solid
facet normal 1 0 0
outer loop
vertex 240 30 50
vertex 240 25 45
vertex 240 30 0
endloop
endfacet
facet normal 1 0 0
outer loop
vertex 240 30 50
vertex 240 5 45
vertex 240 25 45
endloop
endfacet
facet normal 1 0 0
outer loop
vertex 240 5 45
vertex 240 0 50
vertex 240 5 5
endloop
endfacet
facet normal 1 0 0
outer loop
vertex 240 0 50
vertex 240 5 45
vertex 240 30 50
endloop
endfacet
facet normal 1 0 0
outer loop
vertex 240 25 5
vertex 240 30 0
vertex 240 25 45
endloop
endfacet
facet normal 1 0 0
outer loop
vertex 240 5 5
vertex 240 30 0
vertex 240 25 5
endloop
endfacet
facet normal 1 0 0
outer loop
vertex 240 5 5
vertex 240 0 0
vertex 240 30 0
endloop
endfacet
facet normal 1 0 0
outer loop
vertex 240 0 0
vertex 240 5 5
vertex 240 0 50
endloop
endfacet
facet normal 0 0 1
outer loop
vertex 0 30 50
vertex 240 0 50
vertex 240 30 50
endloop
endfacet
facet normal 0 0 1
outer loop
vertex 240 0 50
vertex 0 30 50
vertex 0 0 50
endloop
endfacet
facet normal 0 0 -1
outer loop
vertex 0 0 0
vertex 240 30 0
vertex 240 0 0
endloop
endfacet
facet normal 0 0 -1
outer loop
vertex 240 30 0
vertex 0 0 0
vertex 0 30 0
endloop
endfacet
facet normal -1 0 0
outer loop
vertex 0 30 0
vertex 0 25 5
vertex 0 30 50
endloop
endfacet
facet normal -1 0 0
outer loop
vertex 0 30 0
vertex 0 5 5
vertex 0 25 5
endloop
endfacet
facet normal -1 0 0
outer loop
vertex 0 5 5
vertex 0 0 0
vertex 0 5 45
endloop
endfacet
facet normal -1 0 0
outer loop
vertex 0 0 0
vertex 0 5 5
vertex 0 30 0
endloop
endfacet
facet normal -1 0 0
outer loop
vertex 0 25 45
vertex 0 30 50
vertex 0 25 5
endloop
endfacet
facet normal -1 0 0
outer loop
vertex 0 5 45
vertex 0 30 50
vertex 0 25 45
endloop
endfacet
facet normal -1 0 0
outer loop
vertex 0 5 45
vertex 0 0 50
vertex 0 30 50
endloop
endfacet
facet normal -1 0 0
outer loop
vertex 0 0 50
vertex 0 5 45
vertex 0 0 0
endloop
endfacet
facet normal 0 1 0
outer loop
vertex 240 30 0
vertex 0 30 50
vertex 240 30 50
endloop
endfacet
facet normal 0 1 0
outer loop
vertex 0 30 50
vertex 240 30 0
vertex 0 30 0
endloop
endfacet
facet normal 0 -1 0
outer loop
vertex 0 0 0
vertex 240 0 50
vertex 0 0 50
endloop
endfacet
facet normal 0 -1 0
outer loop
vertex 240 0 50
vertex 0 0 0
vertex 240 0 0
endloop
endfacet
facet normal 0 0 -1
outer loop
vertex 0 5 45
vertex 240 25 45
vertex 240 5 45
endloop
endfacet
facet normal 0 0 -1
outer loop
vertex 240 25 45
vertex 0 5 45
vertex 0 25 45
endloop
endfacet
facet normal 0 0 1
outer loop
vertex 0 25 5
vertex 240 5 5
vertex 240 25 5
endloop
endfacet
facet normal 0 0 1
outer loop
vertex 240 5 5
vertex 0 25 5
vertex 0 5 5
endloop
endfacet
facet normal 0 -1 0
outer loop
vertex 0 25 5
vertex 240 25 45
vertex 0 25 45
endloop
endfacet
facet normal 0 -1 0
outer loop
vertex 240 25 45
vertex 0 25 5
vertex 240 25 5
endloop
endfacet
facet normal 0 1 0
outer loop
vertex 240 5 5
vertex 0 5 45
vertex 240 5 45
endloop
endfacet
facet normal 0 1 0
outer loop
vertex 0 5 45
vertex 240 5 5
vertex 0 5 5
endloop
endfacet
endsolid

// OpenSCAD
$fn = 32;

// ----------------------------------------------------------------------
// Box beam: 200-250 mm hollow beam
// ----------------------------------------------------------------------

// --- parameters (mm) ---
beam_l = 240;             // beam length, X
beam_w = 30;              // beam width, Y
beam_h = 50;              // beam height, Z
wall = 5;                 // wall thickness

difference() {
  cube([beam_l, beam_w, beam_h]);
  translate([-1, wall, wall])
    cube([beam_l + 2, beam_w - 2 * wall, beam_h - 2 * wall]);
}
